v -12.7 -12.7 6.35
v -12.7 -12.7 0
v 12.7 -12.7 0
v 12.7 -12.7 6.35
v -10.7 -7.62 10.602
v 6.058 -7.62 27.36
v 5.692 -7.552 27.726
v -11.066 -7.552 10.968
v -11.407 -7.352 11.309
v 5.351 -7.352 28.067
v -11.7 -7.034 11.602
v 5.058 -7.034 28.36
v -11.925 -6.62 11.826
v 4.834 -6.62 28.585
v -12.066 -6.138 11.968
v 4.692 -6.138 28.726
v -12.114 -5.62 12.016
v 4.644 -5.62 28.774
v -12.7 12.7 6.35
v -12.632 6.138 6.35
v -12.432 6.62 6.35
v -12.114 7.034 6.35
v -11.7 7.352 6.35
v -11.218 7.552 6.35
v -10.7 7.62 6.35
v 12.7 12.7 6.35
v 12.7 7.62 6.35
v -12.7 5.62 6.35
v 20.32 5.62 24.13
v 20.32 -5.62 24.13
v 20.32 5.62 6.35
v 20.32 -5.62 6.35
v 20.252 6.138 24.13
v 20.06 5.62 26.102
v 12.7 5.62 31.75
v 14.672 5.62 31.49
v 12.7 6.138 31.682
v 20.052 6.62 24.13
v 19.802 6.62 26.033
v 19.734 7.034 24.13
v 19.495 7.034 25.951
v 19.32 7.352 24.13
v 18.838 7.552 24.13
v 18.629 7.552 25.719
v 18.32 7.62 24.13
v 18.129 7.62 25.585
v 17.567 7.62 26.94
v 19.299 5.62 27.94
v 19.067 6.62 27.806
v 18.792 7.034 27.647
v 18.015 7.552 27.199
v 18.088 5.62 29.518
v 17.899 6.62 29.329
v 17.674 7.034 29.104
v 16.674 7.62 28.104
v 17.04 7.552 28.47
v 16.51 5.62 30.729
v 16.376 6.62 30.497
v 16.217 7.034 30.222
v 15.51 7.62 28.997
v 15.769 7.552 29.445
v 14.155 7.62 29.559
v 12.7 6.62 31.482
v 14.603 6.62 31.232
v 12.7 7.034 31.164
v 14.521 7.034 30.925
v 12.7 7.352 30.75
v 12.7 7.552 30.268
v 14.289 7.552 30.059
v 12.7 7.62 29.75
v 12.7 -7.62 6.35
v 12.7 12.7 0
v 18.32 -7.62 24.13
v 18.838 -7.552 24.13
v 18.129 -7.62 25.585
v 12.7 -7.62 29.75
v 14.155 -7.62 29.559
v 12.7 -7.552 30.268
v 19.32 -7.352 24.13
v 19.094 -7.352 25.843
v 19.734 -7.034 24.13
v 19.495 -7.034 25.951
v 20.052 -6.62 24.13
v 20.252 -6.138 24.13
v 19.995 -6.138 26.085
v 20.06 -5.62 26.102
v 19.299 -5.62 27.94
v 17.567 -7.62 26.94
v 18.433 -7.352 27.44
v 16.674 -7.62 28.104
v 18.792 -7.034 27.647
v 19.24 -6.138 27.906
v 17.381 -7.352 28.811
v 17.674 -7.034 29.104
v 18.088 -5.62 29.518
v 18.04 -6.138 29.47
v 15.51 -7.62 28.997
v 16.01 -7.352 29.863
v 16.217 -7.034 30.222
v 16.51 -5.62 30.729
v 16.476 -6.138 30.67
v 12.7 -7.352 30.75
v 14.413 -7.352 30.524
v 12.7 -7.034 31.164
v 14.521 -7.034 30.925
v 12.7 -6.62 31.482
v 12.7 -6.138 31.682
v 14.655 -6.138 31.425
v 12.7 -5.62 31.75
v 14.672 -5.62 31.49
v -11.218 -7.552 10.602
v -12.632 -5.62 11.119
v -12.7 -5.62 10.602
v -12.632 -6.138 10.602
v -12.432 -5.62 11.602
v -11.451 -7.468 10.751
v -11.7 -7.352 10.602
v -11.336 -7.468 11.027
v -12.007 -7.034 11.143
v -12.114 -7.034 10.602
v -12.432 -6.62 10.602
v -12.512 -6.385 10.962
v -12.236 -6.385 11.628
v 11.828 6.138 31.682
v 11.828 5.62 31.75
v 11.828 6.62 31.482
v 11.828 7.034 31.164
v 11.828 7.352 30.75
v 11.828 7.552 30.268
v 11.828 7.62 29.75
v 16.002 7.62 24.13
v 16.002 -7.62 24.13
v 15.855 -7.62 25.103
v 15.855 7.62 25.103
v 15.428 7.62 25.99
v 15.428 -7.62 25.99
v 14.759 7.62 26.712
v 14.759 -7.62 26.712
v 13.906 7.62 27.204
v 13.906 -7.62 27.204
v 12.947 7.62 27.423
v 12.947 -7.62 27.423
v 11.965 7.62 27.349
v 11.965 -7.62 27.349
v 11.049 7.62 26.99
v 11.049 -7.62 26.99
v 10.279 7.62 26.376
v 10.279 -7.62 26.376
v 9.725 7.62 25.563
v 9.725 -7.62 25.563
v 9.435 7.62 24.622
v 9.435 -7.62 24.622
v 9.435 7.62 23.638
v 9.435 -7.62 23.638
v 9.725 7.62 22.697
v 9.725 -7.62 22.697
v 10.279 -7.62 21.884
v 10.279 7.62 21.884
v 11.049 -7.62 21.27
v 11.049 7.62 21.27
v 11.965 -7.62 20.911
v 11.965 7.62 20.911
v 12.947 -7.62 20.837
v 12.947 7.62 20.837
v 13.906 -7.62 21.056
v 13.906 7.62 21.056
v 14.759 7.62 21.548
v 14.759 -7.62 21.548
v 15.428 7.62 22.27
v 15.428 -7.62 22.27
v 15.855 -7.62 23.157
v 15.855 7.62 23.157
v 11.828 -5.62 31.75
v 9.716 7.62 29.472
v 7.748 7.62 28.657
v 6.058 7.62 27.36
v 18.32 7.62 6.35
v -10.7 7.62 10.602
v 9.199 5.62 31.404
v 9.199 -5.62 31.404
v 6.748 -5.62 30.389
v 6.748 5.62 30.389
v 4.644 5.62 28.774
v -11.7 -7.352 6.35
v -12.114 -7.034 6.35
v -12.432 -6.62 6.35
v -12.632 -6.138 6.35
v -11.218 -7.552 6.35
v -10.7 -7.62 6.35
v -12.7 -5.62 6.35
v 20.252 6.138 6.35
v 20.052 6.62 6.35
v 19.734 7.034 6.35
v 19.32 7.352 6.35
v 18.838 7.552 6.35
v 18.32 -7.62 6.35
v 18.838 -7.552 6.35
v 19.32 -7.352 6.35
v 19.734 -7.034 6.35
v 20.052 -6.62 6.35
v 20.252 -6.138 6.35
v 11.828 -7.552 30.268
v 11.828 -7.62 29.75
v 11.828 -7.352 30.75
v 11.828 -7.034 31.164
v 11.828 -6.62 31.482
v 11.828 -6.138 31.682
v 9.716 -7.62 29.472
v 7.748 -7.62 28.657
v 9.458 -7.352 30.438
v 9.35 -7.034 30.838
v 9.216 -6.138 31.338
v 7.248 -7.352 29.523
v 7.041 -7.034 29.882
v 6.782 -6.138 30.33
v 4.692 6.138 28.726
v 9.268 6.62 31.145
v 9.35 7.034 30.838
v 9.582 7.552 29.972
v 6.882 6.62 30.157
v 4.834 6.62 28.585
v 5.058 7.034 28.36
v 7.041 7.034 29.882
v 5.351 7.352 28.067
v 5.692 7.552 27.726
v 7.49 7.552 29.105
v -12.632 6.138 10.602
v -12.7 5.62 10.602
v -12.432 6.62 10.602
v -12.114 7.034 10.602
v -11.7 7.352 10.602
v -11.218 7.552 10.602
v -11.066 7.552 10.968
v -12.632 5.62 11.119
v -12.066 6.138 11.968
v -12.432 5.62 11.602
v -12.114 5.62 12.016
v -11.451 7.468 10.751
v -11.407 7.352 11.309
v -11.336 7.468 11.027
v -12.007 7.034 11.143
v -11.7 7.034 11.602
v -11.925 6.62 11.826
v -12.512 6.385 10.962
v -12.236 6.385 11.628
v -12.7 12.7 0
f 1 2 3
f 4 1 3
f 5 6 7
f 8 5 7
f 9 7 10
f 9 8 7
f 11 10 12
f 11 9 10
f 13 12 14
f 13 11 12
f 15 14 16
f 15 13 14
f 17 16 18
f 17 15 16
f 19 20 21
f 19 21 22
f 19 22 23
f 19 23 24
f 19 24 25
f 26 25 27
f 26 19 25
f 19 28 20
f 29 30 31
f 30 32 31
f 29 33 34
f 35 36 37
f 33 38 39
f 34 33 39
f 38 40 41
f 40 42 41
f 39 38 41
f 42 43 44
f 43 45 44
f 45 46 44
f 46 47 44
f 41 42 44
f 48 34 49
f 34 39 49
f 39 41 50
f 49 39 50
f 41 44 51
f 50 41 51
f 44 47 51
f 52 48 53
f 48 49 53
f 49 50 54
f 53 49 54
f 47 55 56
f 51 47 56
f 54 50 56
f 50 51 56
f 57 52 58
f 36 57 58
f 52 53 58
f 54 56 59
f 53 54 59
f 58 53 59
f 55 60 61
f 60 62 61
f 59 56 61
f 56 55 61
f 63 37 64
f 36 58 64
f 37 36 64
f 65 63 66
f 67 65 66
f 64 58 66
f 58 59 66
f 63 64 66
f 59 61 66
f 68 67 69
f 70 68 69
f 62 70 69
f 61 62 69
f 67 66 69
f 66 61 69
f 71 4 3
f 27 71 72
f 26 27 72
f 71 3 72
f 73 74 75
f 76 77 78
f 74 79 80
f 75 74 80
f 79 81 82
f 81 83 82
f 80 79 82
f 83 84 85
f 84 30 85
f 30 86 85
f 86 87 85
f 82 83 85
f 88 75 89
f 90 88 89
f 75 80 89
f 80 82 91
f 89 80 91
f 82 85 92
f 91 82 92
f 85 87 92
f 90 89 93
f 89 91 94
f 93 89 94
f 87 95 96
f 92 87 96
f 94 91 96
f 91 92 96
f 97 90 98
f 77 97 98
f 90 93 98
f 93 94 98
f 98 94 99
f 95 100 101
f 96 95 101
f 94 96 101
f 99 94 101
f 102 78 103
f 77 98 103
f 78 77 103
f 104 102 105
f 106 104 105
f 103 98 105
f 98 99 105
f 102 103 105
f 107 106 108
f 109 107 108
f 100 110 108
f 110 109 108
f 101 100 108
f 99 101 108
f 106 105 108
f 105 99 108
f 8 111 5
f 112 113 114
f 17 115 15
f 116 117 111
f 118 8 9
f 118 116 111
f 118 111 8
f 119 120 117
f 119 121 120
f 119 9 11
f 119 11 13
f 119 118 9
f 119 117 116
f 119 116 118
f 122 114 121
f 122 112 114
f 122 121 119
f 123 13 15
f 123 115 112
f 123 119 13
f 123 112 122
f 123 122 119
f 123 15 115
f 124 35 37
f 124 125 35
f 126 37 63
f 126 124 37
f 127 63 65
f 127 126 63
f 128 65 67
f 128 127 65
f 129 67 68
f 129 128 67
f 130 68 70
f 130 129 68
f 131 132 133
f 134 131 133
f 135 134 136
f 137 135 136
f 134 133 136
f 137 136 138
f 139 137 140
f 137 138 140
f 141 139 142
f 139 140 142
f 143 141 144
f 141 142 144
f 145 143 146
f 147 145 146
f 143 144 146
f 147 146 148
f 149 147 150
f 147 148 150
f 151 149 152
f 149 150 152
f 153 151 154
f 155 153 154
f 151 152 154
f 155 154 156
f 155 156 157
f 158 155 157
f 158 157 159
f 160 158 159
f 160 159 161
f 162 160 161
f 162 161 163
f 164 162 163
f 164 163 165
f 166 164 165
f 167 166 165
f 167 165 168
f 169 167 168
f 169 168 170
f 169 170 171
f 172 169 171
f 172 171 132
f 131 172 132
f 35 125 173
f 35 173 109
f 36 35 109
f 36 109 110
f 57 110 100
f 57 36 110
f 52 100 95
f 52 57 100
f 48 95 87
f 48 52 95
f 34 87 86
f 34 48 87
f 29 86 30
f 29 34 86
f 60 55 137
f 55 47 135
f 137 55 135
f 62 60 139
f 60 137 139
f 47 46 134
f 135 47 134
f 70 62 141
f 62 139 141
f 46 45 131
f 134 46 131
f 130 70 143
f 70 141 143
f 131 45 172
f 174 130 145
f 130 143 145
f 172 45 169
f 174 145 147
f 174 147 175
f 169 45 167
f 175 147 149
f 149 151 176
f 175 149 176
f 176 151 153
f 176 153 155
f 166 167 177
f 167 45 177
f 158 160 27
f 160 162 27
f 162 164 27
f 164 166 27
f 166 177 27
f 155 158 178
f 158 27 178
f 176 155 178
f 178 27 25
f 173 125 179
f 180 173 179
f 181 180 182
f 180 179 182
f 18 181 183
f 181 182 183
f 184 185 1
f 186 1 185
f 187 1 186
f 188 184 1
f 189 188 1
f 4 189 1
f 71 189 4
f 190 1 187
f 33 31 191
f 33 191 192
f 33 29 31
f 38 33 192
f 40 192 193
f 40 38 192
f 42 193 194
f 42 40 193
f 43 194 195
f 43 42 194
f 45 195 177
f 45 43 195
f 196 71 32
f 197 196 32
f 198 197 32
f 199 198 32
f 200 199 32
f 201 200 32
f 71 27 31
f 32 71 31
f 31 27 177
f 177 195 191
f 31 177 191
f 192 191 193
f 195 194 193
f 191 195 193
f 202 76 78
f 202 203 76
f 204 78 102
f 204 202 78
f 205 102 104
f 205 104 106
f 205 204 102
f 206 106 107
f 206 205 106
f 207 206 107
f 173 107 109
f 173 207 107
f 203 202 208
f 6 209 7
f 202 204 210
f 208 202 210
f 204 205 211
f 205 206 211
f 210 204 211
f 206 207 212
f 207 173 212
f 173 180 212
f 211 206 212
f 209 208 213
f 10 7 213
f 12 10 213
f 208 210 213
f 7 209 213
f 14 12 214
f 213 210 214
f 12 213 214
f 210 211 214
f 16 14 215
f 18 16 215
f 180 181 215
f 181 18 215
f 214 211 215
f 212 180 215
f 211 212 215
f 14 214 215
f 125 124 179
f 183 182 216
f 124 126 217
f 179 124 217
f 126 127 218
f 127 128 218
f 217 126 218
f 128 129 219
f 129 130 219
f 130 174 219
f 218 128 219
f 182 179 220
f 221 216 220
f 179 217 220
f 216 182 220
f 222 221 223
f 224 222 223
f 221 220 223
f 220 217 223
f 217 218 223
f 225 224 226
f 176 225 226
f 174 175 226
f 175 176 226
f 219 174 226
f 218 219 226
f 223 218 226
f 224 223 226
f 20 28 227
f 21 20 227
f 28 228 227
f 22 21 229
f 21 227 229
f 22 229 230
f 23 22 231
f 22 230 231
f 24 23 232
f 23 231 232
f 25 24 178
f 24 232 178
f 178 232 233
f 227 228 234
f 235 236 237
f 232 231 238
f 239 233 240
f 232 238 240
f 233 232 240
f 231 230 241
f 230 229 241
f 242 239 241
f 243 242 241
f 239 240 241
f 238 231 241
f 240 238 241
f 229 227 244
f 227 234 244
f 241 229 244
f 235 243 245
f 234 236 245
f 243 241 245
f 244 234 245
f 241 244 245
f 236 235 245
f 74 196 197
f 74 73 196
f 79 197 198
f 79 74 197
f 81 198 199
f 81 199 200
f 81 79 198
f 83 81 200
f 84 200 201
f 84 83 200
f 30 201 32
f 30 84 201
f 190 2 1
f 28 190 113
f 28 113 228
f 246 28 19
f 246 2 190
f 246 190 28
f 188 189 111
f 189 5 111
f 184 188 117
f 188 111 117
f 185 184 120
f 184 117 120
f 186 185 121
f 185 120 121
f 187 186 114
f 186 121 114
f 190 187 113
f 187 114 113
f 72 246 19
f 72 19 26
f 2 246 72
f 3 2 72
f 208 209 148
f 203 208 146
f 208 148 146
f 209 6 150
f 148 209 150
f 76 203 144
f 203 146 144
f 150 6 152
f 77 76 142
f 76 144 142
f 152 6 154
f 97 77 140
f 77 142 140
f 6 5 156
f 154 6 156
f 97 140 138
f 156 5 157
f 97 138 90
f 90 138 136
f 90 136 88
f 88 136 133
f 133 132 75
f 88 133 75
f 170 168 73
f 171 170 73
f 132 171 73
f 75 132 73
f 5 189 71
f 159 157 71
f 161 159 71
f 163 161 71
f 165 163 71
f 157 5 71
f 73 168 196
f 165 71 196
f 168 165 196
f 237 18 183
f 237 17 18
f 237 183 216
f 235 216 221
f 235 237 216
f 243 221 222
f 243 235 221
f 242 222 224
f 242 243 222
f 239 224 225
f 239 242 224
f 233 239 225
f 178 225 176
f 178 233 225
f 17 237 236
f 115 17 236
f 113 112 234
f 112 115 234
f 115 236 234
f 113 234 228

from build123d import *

# Parameters (mm, degrees)
F0_W     = 25.4
F0_H     = 25.4
F1_DEPTH = 6.35
F2_W     = 25.4
F2_H     = 15.24
F2_W_2   = 7.62
F3_DEPTH = 25.4
F4_R     = 7.62
F5_SIZE  = 20.32
F6_R     = 10.16
F7_R     = 3.302
F8_DEPTH = 20.321
F9_R     = 2


with BuildPart() as f1:
    # F0 (on Top) → F1 (new body)
    with BuildSketch(Plane.XY):
        Rectangle(F0_W, F0_H)
    extrude(amount=F1_DEPTH)

    # F2 (on face) → F3 (join)
    with BuildSketch(Plane.XY.offset(6.35)):
        Rectangle(F2_W, F2_H)
        with Locations((16.51, 0)):
            Rectangle(F2_W_2, F2_H)
    extrude(amount=F3_DEPTH)

    # F4
    f4_edges = [f1.edges().sort_by_distance(p)[0] for p in [
        (20.32, 0, 31.75),
    ]]
    fillet(f4_edges, radius=F4_R)

    # F5
    f5_edges = [f1.edges().sort_by_distance(p)[0] for p in [
        (-12.7, 0, 31.75),
    ]]
    chamfer(f5_edges, length=F5_SIZE)

    # F6
    f6_edges = [f1.edges().sort_by_distance(p)[0] for p in [
        (7.62, 0, 31.75),
    ]]
    fillet(f6_edges, radius=F6_R)

    # F7 (on face) → F8 (cut, through all)
    with BuildSketch(Plane.XZ.offset(7.62)):
        with Locations((12.7, 24.13)):
            Circle(F7_R)
    extrude(amount=-F8_DEPTH, mode=Mode.SUBTRACT)

    # F9
    f9_edges = [f1.edges().sort_by_distance(p)[0] for p in [
        (-4.027898, -7.62, 20.102102),
        (-4.027898, 7.62, 20.102102),
        (-12.7, 0, 11.43),
        (-12.7, -7.62, 8.89),
        (-12.7, 7.62, 8.89),
        (12.264205, -7.62, 31.75),
        (7.940346, -7.62, 30.976616),
        (18.088154, -7.62, 29.518154),
        (20.32, -7.62, 15.24),
        (12.264205, 7.62, 31.75),
        (7.940346, 7.62, 30.976616),
        (18.088154, 7.62, 29.518154),
        (20.32, 7.62, 15.24),
    ]]
    fillet(f9_edges, radius=F9_R)


solid = f1.part
